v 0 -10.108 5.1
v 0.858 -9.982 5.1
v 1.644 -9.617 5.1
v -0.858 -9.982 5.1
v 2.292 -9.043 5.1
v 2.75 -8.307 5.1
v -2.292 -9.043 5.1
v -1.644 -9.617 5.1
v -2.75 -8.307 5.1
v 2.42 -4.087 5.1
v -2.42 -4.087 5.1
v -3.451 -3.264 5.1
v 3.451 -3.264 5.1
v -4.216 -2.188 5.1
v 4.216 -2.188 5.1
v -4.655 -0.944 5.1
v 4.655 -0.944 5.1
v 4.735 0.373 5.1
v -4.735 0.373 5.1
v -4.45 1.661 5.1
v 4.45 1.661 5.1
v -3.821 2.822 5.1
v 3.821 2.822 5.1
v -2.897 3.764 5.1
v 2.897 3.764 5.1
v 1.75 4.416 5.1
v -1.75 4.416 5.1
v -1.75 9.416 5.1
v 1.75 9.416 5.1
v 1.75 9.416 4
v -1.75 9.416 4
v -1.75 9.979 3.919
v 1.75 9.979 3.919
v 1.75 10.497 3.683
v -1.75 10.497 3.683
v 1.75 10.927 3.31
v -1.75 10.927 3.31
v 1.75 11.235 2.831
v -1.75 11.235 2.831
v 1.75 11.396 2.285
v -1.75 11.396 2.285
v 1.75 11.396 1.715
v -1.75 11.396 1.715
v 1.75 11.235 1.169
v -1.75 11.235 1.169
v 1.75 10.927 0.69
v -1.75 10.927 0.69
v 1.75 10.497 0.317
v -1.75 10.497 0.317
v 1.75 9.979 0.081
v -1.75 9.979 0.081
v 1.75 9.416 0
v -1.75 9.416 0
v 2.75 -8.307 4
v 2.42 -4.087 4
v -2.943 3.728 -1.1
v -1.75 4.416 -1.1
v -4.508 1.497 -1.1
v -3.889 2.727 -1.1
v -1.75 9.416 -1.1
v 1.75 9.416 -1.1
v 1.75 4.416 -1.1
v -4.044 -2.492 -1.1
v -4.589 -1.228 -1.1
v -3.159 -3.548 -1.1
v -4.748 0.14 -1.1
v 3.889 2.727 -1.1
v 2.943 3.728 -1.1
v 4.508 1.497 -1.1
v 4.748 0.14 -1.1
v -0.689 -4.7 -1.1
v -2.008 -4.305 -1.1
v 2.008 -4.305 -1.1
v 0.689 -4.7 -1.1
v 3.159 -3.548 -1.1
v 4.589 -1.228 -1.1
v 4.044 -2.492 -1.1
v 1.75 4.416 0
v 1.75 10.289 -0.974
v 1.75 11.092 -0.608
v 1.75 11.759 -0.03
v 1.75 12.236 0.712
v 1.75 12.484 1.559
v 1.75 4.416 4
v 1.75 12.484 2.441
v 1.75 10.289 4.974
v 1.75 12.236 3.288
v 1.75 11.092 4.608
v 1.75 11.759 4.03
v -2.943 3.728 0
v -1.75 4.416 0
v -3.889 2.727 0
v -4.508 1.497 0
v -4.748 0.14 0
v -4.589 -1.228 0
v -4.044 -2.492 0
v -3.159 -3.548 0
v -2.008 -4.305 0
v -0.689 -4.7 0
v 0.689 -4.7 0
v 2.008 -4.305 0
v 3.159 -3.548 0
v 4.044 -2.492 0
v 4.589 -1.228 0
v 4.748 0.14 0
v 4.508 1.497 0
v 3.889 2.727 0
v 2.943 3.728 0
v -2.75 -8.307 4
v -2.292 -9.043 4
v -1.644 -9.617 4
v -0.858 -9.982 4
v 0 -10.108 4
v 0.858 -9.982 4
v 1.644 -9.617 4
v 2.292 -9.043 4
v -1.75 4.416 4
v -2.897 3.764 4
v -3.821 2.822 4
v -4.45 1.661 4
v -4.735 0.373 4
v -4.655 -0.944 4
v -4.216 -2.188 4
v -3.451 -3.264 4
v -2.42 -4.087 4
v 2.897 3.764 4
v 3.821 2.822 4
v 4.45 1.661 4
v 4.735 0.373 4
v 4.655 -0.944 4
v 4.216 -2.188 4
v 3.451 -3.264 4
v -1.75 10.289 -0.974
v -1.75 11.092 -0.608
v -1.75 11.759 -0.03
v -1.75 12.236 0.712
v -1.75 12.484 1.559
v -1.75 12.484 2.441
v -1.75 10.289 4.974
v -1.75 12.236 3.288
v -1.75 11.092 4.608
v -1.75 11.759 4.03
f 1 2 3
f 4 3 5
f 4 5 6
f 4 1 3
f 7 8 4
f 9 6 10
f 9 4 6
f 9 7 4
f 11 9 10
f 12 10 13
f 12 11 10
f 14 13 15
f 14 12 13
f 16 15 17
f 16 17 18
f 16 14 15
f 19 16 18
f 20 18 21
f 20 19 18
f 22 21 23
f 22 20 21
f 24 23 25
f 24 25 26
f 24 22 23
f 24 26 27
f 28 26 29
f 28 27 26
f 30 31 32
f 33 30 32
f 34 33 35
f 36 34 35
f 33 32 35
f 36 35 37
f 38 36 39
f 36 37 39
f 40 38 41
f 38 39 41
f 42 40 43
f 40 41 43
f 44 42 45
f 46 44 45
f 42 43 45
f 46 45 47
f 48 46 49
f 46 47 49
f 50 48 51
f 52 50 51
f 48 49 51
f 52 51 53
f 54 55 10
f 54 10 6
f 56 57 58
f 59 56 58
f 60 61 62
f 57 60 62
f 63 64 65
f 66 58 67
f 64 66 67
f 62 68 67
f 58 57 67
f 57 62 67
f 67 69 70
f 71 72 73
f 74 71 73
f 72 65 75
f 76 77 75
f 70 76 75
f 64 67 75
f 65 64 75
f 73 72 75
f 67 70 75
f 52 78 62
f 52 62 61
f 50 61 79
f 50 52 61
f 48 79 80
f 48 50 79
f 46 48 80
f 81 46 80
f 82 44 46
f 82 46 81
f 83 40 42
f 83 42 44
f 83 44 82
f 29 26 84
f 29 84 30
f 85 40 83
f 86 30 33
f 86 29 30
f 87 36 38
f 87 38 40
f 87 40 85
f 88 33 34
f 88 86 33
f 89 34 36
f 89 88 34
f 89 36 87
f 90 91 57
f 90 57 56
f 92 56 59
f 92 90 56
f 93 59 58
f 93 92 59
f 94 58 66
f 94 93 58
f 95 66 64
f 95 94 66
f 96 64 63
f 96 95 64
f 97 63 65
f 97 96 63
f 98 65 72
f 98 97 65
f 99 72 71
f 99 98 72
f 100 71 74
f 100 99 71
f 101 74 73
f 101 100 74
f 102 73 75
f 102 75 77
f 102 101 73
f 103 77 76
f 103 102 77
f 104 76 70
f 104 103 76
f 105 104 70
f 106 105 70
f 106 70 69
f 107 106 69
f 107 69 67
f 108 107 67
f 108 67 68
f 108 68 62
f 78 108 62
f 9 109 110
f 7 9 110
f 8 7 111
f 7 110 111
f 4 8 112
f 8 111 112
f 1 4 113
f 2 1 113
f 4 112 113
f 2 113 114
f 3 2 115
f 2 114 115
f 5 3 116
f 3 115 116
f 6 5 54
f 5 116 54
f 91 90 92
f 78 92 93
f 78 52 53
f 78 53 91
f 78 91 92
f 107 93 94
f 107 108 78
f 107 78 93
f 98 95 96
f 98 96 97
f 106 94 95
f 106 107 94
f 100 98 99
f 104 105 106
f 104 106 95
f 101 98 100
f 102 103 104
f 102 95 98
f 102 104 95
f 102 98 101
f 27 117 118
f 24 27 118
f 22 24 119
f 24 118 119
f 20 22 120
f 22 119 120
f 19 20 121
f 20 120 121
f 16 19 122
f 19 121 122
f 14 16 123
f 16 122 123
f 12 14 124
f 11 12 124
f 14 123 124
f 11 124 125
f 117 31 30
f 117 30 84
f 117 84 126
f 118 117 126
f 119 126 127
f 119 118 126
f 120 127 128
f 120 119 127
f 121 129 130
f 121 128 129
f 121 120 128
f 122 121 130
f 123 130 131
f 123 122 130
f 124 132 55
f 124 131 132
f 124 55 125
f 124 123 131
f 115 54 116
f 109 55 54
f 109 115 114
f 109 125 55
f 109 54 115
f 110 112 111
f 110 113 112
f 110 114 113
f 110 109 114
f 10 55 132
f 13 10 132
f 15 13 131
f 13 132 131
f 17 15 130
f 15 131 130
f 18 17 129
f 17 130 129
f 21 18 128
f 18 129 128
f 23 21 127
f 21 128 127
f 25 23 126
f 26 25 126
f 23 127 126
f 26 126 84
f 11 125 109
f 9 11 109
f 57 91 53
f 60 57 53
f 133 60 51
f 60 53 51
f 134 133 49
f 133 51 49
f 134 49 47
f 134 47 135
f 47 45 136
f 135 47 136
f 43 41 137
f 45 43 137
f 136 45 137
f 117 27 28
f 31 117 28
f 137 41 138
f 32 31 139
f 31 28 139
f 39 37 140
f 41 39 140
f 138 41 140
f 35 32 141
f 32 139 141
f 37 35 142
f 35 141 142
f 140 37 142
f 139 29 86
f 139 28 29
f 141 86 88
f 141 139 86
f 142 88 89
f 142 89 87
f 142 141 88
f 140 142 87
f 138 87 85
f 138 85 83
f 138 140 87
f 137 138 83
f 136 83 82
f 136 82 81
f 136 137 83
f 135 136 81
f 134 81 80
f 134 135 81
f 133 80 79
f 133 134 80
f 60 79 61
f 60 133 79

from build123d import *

# Parameters (mm, degrees)
PAD013_DEPTH            = 1.1
PAD014_DEPTH            = 1.75
PAD014_DEPTH_BACK       = 1.75
PAD015_DEPTH            = 1.1
BODY008_PLACEMENT_ANGLE = 90


with BuildPart() as part:
    # Sketch022 → Pad013 (new body)
    with BuildSketch(Plane.XY):
        with BuildLine():
            ThreePointArc((-4.41588, -1.75), (-0.373115, -4.735323), (4.08731, -2.42))
            Line((4.08731, -2.42), (8.306624, -2.75))
            ThreePointArc((8.306624, -2.75), (10.107666, 0), (8.306624, 2.75))
            Line((4.08731, 2.42), (8.306624, 2.75))
            ThreePointArc((4.08731, 2.42), (-0.373115, 4.735323), (-4.41588, 1.75))
            Line((-4.41588, -1.75), (-4.41588, 1.75))
        make_face()
    extrude(amount=PAD013_DEPTH)

    # Sketch023 → Pad014 (join, two sides)
    with BuildSketch(Plane.XZ) as pad014_sk:
        with BuildLine():
            ThreePointArc((-9.41588, 0), (-11.41588, -2), (-9.41588, -4))
            Line((-9.41588, -4), (-4.41588, -4))
            Line((-4.41588, -4), (-4.41588, -5.1))
            Line((-9.41588, -5.1), (-4.41588, -5.1))
            ThreePointArc((-9.41588, 1.1), (-12.51588, -2), (-9.41588, -5.1))
            Line((-4.41588, 1.1), (-9.41588, 1.1))
            Line((-4.41588, 1.1), (-4.41588, 0))
            Line((-9.41588, 0), (-4.41588, 0))
        make_face()
    extrude(amount=PAD014_DEPTH)
    extrude(pad014_sk.sketch, amount=-PAD014_DEPTH_BACK)

    # Sketch025 (on Face9 of Pad014) → Pad015 (join)
    with BuildSketch(Plane.XY.offset(-4)):
        with BuildLine():
            ThreePointArc((-4.41588, -1.75), (4.75, 0), (-4.41588, 1.75))
            Line((-4.41588, 1.75), (-4.41588, -1.75))
        make_face()
    extrude(amount=-PAD015_DEPTH)


with BuildPart() as part_1:
    # Body008 placement: moved
    add(part.part.moved(Location((0, 0, 4))).rotate(Axis((0, 0, 4), (0, 0, -1)), BODY008_PLACEMENT_ANGLE))


solid = part_1.part
